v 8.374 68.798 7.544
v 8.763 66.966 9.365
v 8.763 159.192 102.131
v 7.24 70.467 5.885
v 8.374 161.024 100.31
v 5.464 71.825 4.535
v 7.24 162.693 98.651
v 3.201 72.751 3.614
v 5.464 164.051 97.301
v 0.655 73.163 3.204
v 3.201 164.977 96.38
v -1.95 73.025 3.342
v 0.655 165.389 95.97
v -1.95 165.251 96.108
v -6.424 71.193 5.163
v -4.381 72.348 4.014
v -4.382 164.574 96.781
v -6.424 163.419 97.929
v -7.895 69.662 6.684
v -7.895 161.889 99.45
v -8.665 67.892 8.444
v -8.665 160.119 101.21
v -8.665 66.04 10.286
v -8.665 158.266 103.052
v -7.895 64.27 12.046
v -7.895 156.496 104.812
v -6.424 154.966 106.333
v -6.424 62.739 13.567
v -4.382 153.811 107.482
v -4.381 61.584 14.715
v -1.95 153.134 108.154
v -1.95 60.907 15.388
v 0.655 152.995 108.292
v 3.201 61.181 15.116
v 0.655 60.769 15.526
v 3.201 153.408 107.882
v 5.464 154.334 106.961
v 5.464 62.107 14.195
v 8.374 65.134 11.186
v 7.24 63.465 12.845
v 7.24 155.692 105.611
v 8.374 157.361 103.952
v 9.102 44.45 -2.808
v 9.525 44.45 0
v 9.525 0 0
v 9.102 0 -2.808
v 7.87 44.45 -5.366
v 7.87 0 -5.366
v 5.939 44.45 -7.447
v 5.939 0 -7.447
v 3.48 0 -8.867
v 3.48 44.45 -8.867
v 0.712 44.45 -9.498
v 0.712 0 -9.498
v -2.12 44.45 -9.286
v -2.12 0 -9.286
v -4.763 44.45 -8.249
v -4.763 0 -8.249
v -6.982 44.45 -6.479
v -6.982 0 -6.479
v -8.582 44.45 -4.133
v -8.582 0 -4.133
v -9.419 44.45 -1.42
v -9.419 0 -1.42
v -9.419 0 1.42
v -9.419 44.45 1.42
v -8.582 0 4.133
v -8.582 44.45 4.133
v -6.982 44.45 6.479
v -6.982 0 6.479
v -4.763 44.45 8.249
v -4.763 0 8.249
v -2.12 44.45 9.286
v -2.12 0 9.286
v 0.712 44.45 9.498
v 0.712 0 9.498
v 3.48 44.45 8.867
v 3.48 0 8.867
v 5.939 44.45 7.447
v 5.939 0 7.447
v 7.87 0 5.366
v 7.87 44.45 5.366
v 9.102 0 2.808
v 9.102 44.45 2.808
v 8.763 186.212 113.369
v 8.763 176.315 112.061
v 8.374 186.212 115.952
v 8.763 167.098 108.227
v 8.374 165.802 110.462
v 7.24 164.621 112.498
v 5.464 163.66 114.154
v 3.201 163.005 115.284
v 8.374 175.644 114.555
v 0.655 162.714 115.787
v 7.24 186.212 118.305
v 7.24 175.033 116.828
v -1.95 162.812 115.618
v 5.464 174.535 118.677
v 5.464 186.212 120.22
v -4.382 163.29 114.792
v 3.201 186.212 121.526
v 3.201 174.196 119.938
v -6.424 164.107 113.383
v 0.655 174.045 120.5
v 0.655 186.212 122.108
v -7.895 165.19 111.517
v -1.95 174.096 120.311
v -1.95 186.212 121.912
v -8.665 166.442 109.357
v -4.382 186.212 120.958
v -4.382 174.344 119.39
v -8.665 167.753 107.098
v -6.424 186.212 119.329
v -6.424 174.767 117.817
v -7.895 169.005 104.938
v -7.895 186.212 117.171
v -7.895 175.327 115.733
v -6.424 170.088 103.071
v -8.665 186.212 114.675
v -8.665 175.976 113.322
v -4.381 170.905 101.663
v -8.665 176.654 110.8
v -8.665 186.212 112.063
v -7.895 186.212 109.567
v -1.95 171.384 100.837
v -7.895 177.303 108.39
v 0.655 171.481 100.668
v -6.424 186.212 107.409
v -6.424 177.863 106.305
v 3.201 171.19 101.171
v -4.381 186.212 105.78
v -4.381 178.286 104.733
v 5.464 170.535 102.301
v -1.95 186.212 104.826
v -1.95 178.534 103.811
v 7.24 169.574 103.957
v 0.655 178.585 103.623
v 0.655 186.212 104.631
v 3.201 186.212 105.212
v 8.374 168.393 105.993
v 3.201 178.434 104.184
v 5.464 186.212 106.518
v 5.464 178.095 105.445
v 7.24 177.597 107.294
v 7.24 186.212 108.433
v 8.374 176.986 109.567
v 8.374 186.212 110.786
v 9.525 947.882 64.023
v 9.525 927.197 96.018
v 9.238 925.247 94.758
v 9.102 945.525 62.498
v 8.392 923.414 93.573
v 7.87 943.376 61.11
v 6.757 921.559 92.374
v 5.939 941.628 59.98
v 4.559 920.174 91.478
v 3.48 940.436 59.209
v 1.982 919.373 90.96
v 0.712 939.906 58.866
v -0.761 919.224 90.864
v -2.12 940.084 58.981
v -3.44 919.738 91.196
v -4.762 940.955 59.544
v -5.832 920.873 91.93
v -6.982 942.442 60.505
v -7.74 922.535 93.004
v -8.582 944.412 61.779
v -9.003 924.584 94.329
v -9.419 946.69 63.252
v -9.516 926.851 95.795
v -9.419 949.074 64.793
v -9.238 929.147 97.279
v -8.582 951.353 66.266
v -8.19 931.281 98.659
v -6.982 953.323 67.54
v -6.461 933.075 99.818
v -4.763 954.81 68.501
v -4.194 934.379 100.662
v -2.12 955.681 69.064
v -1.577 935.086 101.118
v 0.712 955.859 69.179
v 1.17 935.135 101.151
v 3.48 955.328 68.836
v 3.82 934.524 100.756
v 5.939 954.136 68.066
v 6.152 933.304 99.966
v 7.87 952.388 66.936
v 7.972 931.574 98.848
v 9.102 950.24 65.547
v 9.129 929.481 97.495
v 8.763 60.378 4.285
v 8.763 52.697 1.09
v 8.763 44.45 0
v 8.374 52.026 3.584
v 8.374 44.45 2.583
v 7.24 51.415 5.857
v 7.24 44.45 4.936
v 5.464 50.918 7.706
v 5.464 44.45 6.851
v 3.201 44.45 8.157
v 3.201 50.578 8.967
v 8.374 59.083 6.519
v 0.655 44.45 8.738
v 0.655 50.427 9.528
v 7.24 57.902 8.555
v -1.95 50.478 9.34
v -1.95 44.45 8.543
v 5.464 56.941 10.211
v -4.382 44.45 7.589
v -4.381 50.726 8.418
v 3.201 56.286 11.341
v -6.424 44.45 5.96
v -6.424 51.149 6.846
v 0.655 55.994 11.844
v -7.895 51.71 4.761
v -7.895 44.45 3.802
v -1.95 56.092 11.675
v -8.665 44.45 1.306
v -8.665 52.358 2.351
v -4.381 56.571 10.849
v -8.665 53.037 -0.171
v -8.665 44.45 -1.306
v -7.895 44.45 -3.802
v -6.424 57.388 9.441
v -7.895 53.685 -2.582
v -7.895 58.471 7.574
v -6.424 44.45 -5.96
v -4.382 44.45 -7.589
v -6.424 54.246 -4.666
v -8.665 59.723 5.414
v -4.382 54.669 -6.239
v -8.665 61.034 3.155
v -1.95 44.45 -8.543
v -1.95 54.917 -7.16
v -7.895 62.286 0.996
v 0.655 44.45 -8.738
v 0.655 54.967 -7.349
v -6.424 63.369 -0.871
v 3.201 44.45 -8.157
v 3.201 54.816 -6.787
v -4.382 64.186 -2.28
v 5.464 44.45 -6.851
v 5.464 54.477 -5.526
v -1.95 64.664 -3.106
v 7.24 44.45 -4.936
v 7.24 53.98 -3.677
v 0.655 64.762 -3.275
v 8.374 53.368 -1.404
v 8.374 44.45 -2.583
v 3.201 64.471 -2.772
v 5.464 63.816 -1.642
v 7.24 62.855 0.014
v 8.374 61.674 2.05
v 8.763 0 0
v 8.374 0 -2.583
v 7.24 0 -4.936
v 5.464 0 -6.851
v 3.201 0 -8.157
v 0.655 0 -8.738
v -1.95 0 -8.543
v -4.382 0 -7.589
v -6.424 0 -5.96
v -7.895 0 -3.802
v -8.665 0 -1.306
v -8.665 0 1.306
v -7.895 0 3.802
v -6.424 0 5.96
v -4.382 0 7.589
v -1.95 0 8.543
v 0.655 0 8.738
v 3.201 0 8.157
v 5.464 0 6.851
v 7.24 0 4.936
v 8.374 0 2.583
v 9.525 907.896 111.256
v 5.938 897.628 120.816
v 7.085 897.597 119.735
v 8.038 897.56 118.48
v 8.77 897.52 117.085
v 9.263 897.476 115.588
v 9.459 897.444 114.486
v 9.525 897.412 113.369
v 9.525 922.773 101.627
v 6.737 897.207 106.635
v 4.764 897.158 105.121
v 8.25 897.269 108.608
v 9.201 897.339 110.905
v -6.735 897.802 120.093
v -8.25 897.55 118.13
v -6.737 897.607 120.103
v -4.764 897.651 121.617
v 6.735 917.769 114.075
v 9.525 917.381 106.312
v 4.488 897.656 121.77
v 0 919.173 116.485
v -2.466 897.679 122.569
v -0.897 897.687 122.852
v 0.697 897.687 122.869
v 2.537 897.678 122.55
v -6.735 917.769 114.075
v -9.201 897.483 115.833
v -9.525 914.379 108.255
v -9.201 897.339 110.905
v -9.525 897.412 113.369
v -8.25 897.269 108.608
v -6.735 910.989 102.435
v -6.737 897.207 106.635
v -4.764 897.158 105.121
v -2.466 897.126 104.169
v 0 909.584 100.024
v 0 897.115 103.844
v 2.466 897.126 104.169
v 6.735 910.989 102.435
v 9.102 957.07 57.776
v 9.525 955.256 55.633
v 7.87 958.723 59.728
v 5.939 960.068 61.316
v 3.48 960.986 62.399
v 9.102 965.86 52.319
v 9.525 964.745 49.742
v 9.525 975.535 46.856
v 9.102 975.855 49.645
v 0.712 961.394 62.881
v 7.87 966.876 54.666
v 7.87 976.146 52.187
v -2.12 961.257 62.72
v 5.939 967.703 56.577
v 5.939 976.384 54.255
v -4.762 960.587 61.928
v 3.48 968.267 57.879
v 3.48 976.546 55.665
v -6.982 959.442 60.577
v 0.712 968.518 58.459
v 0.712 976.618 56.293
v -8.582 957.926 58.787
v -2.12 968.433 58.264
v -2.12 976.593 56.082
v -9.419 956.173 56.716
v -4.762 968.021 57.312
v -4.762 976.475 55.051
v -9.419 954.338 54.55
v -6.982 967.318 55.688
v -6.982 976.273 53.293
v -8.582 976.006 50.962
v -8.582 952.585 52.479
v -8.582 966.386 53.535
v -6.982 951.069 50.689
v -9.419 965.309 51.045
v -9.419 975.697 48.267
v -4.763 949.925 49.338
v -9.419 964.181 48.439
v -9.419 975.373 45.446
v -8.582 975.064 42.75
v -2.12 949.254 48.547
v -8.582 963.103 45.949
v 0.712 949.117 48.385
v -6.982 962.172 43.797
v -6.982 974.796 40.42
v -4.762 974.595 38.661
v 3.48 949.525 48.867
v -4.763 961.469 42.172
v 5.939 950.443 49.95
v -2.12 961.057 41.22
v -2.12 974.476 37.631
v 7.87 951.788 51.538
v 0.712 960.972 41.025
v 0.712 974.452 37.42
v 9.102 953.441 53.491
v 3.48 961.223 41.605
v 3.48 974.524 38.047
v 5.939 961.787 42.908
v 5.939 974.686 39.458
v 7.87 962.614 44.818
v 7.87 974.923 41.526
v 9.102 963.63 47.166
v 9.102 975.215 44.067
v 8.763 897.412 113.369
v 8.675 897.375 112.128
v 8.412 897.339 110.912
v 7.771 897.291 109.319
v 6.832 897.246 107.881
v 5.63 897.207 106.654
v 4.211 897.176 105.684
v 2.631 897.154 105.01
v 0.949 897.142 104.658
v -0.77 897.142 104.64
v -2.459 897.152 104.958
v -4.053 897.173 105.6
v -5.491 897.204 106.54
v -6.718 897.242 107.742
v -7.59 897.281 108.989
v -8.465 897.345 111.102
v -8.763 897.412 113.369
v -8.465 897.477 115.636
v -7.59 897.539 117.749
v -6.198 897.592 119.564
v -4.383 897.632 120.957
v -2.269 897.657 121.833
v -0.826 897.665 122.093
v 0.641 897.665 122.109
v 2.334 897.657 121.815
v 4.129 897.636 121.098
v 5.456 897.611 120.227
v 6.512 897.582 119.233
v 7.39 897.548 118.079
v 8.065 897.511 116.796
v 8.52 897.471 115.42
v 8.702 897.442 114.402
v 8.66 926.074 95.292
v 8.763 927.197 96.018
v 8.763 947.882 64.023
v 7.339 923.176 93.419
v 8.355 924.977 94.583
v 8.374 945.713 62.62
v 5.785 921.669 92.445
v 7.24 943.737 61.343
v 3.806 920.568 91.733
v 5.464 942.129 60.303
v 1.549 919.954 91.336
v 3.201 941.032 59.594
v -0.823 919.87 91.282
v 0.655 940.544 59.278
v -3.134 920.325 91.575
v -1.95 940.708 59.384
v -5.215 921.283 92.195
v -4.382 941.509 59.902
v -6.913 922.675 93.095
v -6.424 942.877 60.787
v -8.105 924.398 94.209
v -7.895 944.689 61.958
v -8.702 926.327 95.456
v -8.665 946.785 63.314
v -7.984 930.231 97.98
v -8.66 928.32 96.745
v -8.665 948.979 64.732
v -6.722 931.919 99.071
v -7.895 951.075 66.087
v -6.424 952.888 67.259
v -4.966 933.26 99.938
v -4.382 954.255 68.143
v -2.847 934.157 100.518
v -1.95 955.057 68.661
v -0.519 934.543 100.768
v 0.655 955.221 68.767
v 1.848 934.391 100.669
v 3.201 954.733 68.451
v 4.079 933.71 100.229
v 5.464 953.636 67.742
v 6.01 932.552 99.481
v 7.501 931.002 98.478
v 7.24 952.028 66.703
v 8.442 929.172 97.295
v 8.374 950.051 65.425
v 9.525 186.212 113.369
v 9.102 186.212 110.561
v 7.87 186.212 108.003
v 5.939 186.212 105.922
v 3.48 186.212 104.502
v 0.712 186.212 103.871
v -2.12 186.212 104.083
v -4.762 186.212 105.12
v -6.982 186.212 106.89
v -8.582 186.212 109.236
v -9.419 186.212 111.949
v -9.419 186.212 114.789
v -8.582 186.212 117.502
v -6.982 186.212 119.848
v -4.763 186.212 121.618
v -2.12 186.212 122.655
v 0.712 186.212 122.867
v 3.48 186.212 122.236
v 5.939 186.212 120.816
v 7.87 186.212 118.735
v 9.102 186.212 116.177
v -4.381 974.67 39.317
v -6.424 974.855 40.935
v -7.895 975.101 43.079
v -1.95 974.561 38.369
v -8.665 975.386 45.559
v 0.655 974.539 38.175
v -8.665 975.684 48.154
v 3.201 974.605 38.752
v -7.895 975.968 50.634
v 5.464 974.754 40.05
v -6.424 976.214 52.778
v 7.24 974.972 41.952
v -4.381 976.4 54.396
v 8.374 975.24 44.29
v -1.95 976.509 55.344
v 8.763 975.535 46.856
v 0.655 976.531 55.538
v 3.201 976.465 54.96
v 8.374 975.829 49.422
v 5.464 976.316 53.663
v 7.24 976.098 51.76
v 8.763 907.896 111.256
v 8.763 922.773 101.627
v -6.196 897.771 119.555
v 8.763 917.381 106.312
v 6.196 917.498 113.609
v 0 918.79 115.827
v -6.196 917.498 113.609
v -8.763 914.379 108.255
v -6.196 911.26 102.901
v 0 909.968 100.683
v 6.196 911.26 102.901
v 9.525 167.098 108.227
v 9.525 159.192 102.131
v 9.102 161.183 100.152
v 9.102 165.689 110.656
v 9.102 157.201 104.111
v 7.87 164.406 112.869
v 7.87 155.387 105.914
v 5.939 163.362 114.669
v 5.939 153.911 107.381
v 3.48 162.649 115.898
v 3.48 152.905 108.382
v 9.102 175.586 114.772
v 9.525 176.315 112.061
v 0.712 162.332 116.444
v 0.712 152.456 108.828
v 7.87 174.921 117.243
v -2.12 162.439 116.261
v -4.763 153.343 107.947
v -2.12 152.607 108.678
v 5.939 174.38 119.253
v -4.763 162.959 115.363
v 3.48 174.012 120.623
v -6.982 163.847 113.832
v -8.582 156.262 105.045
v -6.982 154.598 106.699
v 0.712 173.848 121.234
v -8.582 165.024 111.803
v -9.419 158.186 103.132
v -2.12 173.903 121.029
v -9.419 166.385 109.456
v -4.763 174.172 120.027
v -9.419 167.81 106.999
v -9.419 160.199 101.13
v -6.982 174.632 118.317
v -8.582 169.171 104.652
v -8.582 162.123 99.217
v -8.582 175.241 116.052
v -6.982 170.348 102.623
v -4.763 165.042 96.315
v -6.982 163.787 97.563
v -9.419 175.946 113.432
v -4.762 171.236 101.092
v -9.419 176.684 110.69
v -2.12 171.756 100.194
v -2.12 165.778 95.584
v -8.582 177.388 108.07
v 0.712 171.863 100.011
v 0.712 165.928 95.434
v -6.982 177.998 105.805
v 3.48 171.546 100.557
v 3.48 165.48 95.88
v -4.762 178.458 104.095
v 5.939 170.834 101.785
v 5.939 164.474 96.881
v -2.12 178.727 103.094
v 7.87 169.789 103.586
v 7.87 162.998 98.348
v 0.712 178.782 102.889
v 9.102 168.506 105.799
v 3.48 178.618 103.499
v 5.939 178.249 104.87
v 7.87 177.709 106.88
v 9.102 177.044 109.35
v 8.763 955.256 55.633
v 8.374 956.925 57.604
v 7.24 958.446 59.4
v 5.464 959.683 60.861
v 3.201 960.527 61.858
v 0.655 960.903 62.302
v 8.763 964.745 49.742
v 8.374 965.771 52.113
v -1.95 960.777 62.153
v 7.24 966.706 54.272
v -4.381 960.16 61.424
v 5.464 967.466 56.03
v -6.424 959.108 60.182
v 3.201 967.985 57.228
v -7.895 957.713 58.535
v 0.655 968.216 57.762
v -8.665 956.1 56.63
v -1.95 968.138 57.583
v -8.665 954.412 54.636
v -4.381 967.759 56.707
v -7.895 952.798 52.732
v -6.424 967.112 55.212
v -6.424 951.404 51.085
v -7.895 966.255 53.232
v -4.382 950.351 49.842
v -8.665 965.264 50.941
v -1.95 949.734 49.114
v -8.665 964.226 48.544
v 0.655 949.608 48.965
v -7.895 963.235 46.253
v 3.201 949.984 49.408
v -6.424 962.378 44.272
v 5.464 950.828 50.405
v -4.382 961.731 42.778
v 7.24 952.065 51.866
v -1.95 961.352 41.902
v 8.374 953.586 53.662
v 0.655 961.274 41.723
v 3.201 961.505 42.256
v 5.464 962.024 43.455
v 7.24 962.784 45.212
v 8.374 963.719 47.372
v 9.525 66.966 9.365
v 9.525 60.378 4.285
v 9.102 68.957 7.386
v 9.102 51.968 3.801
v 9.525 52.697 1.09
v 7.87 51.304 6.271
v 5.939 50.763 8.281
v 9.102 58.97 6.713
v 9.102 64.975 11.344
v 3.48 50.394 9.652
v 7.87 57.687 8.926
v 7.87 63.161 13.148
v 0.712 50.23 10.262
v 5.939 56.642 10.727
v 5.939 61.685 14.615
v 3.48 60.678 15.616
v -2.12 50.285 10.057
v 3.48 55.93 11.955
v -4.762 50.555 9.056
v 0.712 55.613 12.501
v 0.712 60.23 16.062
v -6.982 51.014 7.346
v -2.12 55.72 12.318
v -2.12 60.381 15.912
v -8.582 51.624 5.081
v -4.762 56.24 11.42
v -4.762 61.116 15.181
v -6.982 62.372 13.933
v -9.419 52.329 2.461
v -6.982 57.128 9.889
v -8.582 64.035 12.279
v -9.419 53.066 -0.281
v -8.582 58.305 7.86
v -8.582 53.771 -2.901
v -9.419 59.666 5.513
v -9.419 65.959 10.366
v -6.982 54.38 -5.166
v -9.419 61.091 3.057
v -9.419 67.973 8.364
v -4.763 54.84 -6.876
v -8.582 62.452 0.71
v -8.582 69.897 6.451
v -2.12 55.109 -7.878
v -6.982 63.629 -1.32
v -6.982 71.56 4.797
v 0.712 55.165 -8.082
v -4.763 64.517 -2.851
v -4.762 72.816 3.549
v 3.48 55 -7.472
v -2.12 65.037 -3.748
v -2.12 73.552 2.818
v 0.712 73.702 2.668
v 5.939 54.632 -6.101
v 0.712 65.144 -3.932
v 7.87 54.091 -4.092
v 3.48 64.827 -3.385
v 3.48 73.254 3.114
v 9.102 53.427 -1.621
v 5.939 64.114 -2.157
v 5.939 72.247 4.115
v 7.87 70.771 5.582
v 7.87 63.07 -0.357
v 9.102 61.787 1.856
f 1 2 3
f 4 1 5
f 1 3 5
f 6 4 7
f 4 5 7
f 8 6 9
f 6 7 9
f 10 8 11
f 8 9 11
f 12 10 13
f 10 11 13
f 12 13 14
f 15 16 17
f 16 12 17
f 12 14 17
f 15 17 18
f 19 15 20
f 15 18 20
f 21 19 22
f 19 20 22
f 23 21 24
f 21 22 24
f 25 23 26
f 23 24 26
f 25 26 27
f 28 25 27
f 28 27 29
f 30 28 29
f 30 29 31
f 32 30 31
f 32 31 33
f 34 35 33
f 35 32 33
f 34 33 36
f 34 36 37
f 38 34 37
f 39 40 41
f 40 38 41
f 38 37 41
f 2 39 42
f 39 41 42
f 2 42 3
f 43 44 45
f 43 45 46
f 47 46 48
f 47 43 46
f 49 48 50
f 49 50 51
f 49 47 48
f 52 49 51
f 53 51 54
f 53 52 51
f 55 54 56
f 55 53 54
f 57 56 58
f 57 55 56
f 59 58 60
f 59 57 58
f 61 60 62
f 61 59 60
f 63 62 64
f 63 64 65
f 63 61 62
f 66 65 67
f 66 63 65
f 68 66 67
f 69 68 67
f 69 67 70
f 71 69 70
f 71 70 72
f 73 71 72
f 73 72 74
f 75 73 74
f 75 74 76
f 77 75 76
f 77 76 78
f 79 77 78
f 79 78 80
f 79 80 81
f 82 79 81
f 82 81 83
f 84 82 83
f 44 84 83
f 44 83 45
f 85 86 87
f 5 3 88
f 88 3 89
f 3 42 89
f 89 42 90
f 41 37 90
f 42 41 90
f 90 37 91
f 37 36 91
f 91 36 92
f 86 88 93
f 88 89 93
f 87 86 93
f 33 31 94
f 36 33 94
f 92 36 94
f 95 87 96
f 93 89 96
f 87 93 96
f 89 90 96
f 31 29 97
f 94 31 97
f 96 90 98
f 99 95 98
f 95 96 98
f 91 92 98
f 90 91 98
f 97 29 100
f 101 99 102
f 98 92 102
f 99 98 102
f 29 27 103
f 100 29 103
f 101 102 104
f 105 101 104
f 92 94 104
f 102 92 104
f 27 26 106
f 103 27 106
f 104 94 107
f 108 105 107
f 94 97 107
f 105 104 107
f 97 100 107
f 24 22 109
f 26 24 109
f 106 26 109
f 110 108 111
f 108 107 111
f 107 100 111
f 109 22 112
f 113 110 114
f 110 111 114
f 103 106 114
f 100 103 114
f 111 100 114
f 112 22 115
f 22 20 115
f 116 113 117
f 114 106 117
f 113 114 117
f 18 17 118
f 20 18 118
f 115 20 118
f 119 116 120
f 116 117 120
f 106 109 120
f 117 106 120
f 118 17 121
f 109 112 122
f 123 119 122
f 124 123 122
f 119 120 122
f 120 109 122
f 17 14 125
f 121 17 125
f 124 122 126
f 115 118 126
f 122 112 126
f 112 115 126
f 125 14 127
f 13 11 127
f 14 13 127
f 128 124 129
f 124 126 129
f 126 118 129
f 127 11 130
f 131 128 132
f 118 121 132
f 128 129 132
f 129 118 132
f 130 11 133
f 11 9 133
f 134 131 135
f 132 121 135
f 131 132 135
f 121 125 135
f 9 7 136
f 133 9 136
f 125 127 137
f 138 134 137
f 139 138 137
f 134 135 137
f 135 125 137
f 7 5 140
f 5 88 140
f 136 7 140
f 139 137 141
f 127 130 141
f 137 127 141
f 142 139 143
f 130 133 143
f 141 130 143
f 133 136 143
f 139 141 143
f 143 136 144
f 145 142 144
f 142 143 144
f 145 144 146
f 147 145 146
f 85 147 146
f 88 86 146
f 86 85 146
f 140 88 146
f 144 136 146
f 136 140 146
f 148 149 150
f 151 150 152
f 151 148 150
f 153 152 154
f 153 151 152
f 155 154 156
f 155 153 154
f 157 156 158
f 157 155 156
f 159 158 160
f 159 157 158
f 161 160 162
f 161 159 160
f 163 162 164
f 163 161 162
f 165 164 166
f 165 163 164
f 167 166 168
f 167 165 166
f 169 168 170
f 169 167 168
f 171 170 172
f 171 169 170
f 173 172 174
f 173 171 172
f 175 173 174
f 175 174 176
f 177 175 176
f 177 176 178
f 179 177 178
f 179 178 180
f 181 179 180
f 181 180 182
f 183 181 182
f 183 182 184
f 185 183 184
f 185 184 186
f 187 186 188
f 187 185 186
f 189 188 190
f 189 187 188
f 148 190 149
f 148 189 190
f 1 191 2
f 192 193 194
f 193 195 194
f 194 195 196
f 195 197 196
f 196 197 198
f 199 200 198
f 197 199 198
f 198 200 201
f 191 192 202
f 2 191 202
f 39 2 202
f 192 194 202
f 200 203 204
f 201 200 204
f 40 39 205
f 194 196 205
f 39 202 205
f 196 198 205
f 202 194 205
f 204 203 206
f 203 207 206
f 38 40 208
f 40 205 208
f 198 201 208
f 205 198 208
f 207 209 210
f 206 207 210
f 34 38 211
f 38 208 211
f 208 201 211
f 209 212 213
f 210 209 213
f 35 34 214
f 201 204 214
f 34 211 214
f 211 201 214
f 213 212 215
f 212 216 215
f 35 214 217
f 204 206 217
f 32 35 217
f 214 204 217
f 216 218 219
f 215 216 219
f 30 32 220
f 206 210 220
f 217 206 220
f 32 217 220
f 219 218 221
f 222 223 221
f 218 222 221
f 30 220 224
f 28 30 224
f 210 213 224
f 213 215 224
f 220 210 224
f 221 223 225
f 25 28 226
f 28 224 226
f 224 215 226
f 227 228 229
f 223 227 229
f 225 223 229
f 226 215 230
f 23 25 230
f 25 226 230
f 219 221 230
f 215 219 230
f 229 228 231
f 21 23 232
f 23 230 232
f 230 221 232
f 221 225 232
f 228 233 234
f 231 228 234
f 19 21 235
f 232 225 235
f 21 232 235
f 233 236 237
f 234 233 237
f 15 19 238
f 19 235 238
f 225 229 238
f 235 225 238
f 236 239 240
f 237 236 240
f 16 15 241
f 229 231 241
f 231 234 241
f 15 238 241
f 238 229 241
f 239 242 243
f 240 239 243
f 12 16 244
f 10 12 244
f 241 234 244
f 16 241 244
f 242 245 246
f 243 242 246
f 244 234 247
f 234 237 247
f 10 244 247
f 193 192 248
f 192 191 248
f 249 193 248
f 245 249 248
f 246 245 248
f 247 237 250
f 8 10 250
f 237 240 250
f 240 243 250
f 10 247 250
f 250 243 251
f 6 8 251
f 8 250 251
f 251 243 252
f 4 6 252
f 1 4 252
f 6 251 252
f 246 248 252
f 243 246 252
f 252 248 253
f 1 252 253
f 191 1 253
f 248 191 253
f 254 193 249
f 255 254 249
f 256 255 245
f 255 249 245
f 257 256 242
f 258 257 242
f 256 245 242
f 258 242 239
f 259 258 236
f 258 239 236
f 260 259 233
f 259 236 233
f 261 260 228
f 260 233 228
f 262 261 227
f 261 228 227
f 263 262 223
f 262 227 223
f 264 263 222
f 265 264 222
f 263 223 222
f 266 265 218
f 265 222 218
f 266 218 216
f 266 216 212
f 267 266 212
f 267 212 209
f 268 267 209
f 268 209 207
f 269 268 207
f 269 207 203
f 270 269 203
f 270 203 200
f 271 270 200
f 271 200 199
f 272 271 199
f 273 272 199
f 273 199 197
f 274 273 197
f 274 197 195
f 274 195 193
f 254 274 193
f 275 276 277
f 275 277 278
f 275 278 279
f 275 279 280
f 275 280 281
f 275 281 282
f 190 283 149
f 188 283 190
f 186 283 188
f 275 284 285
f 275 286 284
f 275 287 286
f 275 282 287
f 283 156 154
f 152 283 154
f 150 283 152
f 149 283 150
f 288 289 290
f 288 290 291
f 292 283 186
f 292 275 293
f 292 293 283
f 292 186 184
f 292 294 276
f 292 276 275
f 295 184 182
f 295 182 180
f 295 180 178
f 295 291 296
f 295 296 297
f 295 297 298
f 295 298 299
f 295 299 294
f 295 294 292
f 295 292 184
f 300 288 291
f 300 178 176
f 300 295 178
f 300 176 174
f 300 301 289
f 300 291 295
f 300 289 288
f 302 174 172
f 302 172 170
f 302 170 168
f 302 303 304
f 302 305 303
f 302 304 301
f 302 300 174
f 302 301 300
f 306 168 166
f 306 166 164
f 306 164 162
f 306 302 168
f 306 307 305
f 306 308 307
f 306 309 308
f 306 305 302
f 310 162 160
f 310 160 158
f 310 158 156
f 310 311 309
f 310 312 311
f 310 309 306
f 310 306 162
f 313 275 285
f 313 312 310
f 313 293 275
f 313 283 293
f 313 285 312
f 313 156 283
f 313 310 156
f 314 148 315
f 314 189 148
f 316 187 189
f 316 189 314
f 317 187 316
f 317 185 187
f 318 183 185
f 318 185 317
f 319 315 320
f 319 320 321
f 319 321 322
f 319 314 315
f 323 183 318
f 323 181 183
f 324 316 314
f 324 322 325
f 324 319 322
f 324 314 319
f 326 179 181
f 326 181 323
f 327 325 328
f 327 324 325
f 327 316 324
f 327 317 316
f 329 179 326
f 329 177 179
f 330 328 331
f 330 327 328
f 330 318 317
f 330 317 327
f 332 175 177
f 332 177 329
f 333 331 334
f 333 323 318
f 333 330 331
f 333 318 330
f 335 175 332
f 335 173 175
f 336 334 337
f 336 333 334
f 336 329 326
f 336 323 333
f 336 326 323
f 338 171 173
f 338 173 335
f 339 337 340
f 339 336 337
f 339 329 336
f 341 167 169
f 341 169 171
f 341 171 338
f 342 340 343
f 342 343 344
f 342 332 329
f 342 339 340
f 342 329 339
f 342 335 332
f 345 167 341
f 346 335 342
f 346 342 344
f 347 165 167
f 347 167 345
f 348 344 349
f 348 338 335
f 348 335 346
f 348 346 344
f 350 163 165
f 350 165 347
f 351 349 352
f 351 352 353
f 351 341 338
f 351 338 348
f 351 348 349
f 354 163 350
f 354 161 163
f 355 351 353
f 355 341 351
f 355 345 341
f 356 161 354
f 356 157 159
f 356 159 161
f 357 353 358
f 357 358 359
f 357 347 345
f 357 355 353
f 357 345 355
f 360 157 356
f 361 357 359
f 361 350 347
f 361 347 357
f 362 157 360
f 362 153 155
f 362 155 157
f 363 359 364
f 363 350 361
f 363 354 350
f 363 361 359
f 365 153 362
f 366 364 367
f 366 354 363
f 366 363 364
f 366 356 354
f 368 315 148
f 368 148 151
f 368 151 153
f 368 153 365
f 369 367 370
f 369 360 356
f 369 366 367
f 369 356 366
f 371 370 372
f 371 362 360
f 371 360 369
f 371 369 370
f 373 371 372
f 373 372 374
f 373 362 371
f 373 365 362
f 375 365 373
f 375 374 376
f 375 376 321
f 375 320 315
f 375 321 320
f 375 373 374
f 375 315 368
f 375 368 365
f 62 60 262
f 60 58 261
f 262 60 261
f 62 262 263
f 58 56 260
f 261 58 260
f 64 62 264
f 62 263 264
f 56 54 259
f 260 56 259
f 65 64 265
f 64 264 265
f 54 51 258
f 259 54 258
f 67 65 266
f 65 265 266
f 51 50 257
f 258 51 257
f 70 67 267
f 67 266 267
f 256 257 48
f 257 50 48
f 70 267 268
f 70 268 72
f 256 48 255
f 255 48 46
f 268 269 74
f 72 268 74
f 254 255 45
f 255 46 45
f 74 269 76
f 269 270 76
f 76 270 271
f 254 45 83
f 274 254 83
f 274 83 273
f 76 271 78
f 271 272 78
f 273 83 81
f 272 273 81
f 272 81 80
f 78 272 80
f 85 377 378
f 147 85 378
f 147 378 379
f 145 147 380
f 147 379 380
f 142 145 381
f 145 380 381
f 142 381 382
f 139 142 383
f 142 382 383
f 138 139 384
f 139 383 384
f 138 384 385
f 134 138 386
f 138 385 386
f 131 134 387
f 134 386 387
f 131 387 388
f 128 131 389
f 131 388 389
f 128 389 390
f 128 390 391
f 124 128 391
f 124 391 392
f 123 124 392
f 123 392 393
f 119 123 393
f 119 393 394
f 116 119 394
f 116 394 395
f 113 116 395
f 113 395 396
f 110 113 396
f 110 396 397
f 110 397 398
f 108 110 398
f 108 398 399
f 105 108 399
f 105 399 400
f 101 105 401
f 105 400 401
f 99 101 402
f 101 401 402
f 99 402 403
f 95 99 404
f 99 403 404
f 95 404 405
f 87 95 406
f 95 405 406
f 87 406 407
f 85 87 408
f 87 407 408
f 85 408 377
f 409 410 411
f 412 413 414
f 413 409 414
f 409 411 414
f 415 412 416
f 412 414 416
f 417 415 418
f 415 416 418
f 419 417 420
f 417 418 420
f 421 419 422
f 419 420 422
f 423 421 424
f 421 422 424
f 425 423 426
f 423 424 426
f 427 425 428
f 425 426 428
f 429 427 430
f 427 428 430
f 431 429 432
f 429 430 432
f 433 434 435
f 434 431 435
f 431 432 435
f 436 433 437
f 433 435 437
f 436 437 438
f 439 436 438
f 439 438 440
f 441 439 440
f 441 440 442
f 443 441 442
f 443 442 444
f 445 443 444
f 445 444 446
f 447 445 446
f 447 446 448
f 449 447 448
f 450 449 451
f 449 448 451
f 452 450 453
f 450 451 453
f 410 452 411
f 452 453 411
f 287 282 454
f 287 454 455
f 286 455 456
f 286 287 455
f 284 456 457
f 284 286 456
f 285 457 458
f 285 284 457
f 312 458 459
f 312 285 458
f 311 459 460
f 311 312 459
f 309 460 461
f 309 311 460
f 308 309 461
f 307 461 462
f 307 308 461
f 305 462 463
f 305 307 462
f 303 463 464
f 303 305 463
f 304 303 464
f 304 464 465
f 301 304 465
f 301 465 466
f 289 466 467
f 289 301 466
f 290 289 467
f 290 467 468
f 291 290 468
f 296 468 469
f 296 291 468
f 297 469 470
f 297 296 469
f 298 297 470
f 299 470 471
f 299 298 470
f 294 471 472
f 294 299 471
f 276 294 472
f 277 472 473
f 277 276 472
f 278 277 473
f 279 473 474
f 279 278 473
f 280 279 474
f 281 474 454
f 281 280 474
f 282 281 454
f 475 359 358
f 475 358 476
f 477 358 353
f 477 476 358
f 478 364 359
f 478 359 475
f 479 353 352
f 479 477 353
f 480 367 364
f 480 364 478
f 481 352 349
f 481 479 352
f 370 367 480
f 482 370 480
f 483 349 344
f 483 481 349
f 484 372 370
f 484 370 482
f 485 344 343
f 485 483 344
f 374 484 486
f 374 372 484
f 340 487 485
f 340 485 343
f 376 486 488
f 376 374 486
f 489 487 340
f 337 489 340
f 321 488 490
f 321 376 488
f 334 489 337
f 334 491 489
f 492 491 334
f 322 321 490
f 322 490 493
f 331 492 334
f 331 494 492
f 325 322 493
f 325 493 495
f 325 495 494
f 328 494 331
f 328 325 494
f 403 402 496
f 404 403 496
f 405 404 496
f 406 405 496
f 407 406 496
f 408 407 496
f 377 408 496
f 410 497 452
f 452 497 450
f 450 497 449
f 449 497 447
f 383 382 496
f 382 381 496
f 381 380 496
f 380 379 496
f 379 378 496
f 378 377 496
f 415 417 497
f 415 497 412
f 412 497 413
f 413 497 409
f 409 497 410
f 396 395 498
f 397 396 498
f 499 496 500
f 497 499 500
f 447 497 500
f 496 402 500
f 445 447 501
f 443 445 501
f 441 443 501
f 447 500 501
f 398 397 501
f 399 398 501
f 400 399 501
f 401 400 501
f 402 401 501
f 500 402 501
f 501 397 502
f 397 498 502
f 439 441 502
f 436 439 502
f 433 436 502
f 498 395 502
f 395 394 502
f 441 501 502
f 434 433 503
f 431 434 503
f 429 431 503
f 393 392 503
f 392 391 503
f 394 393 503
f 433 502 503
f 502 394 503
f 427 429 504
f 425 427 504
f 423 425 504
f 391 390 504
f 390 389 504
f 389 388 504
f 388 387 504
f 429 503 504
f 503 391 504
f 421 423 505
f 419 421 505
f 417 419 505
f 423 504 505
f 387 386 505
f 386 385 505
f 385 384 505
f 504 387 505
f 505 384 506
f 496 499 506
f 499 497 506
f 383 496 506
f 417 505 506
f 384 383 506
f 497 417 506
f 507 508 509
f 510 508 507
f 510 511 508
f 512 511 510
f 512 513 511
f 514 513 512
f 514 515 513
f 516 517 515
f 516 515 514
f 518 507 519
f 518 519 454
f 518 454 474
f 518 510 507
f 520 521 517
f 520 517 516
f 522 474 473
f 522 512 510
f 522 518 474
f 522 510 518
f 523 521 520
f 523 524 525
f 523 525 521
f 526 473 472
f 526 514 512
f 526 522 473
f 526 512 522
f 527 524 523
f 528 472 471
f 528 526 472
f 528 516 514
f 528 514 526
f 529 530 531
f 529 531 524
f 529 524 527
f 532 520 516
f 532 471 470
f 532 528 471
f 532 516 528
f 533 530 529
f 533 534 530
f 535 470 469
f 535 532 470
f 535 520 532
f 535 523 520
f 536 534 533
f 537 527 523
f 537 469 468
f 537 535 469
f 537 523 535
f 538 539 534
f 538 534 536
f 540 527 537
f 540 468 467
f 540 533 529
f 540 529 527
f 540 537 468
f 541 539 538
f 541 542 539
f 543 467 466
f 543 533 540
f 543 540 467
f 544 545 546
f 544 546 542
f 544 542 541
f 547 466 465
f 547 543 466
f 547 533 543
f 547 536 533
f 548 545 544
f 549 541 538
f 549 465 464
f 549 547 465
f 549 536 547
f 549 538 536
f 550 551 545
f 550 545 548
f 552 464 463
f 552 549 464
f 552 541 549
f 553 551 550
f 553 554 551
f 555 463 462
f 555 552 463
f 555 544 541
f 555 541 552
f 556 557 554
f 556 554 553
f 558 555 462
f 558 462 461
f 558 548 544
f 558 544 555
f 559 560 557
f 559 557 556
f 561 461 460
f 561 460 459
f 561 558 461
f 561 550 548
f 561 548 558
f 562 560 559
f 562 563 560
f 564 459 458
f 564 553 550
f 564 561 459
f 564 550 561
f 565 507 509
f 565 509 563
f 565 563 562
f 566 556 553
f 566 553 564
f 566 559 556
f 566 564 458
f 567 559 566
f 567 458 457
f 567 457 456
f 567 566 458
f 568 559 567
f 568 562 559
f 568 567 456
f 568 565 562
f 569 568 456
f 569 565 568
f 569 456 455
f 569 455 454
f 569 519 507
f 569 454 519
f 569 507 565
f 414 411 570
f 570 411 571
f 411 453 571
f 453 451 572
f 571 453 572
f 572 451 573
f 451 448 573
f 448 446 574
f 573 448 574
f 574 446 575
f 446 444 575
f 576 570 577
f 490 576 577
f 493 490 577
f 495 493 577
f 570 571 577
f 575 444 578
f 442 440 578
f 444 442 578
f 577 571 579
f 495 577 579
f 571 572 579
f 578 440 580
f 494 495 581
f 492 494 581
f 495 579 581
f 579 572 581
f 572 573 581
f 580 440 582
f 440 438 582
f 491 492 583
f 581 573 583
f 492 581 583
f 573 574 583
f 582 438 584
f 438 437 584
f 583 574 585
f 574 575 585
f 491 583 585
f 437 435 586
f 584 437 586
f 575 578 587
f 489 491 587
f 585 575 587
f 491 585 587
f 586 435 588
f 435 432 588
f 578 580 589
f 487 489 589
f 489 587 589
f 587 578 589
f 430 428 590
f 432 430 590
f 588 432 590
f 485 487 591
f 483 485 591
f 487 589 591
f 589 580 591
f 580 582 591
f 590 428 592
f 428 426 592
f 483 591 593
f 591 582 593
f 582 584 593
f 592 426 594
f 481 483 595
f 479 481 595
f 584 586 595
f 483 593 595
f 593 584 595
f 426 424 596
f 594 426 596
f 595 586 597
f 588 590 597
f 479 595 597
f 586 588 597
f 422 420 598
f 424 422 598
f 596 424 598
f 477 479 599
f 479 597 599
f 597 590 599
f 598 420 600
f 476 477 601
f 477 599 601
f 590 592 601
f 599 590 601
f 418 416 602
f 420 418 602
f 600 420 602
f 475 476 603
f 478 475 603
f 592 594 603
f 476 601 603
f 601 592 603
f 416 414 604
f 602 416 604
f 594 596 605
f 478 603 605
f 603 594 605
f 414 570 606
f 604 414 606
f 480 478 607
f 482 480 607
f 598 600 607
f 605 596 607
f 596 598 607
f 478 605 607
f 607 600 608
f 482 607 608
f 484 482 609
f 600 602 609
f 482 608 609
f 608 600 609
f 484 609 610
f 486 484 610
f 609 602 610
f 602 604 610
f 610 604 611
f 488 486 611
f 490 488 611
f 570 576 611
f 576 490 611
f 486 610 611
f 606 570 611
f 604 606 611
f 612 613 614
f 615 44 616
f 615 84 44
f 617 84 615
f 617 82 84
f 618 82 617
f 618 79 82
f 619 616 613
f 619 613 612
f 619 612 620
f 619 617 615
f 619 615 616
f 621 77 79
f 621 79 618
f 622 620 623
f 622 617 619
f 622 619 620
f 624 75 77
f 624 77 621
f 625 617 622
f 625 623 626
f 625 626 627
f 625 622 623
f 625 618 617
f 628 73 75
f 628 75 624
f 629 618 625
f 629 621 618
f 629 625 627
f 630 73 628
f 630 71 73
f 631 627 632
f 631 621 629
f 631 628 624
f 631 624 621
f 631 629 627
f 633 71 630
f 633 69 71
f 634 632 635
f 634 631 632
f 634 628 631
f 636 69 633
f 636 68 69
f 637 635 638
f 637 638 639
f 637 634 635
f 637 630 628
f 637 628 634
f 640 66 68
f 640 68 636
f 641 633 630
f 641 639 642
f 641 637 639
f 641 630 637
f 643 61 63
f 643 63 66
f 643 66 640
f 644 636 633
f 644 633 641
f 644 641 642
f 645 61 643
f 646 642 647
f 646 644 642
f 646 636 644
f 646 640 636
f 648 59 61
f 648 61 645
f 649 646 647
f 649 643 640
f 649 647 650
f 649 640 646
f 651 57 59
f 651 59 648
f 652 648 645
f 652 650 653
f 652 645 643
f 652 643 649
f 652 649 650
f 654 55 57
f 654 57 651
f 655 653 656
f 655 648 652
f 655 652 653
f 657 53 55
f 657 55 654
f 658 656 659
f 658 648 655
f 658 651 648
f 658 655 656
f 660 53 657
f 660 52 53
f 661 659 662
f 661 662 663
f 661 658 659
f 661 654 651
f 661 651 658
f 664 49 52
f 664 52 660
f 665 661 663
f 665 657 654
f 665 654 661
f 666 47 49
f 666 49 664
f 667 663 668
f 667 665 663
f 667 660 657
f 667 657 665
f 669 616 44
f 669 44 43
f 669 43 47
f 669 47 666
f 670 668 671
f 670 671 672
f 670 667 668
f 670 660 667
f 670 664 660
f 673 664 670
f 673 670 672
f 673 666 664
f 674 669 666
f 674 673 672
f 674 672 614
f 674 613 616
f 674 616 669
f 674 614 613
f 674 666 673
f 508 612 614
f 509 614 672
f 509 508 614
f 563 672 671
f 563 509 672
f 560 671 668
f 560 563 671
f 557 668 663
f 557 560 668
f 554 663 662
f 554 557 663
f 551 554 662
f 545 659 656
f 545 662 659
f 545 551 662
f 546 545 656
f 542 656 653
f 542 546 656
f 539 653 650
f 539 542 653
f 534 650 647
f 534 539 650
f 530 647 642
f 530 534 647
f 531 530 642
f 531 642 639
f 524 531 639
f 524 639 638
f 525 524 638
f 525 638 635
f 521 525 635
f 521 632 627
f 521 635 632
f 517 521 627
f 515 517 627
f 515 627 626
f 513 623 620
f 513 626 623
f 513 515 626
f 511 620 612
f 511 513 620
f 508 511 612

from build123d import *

# Parameters (mm, degrees)
SKETCH1_R   = 9.525
SKETCH1_R_2 = 8.763


with BuildPart() as part:
    # Sweep1: sweep along a path in Sketch4
    with BuildLine(Plane(origin=(0, 0, 0), x_dir=(0, 0, -1), z_dir=(1, 0, 0))) as sweep1_path:
        Line((0, 0), (0, 44.45))
        ThreePointArc((0, 44.45), (-2.434581157, 56.642978228), (-9.364958619, 66.966048107))
        Line((-9.364958619, 66.966048107), (-102.131076821, 159.192418597))
        ThreePointArc((-102.131076821, 159.192418597), (-110.447529775, 171.580102452), (-113.369027163, 186.211676326))
        Line((-113.369027163, 186.211676326), (-113.369027163, 897.411676326))
        ThreePointArc((-113.369027163, 897.411676326), (-108.254814534, 914.37875131), (-96.018442631, 927.197019796))
        Line((-96.018442631, 927.197019796), (-64.022648081, 947.882259246))
        ThreePointArc((-64.022648081, 947.882259246), (-52.338028271, 959.78322333), (-46.856249738, 975.534838814))
    # Sketch1 → Sweep1 (sweep)
    with BuildSketch(Plane(origin=(0, 0, 0), x_dir=(1, 0, 0), z_dir=(0, 1, 0))):
        Circle(SKETCH1_R)
        Circle(SKETCH1_R_2, mode=Mode.SUBTRACT)
    sweep(path=sweep1_path.line, transition=Transition.RIGHT)


solid = part.part
